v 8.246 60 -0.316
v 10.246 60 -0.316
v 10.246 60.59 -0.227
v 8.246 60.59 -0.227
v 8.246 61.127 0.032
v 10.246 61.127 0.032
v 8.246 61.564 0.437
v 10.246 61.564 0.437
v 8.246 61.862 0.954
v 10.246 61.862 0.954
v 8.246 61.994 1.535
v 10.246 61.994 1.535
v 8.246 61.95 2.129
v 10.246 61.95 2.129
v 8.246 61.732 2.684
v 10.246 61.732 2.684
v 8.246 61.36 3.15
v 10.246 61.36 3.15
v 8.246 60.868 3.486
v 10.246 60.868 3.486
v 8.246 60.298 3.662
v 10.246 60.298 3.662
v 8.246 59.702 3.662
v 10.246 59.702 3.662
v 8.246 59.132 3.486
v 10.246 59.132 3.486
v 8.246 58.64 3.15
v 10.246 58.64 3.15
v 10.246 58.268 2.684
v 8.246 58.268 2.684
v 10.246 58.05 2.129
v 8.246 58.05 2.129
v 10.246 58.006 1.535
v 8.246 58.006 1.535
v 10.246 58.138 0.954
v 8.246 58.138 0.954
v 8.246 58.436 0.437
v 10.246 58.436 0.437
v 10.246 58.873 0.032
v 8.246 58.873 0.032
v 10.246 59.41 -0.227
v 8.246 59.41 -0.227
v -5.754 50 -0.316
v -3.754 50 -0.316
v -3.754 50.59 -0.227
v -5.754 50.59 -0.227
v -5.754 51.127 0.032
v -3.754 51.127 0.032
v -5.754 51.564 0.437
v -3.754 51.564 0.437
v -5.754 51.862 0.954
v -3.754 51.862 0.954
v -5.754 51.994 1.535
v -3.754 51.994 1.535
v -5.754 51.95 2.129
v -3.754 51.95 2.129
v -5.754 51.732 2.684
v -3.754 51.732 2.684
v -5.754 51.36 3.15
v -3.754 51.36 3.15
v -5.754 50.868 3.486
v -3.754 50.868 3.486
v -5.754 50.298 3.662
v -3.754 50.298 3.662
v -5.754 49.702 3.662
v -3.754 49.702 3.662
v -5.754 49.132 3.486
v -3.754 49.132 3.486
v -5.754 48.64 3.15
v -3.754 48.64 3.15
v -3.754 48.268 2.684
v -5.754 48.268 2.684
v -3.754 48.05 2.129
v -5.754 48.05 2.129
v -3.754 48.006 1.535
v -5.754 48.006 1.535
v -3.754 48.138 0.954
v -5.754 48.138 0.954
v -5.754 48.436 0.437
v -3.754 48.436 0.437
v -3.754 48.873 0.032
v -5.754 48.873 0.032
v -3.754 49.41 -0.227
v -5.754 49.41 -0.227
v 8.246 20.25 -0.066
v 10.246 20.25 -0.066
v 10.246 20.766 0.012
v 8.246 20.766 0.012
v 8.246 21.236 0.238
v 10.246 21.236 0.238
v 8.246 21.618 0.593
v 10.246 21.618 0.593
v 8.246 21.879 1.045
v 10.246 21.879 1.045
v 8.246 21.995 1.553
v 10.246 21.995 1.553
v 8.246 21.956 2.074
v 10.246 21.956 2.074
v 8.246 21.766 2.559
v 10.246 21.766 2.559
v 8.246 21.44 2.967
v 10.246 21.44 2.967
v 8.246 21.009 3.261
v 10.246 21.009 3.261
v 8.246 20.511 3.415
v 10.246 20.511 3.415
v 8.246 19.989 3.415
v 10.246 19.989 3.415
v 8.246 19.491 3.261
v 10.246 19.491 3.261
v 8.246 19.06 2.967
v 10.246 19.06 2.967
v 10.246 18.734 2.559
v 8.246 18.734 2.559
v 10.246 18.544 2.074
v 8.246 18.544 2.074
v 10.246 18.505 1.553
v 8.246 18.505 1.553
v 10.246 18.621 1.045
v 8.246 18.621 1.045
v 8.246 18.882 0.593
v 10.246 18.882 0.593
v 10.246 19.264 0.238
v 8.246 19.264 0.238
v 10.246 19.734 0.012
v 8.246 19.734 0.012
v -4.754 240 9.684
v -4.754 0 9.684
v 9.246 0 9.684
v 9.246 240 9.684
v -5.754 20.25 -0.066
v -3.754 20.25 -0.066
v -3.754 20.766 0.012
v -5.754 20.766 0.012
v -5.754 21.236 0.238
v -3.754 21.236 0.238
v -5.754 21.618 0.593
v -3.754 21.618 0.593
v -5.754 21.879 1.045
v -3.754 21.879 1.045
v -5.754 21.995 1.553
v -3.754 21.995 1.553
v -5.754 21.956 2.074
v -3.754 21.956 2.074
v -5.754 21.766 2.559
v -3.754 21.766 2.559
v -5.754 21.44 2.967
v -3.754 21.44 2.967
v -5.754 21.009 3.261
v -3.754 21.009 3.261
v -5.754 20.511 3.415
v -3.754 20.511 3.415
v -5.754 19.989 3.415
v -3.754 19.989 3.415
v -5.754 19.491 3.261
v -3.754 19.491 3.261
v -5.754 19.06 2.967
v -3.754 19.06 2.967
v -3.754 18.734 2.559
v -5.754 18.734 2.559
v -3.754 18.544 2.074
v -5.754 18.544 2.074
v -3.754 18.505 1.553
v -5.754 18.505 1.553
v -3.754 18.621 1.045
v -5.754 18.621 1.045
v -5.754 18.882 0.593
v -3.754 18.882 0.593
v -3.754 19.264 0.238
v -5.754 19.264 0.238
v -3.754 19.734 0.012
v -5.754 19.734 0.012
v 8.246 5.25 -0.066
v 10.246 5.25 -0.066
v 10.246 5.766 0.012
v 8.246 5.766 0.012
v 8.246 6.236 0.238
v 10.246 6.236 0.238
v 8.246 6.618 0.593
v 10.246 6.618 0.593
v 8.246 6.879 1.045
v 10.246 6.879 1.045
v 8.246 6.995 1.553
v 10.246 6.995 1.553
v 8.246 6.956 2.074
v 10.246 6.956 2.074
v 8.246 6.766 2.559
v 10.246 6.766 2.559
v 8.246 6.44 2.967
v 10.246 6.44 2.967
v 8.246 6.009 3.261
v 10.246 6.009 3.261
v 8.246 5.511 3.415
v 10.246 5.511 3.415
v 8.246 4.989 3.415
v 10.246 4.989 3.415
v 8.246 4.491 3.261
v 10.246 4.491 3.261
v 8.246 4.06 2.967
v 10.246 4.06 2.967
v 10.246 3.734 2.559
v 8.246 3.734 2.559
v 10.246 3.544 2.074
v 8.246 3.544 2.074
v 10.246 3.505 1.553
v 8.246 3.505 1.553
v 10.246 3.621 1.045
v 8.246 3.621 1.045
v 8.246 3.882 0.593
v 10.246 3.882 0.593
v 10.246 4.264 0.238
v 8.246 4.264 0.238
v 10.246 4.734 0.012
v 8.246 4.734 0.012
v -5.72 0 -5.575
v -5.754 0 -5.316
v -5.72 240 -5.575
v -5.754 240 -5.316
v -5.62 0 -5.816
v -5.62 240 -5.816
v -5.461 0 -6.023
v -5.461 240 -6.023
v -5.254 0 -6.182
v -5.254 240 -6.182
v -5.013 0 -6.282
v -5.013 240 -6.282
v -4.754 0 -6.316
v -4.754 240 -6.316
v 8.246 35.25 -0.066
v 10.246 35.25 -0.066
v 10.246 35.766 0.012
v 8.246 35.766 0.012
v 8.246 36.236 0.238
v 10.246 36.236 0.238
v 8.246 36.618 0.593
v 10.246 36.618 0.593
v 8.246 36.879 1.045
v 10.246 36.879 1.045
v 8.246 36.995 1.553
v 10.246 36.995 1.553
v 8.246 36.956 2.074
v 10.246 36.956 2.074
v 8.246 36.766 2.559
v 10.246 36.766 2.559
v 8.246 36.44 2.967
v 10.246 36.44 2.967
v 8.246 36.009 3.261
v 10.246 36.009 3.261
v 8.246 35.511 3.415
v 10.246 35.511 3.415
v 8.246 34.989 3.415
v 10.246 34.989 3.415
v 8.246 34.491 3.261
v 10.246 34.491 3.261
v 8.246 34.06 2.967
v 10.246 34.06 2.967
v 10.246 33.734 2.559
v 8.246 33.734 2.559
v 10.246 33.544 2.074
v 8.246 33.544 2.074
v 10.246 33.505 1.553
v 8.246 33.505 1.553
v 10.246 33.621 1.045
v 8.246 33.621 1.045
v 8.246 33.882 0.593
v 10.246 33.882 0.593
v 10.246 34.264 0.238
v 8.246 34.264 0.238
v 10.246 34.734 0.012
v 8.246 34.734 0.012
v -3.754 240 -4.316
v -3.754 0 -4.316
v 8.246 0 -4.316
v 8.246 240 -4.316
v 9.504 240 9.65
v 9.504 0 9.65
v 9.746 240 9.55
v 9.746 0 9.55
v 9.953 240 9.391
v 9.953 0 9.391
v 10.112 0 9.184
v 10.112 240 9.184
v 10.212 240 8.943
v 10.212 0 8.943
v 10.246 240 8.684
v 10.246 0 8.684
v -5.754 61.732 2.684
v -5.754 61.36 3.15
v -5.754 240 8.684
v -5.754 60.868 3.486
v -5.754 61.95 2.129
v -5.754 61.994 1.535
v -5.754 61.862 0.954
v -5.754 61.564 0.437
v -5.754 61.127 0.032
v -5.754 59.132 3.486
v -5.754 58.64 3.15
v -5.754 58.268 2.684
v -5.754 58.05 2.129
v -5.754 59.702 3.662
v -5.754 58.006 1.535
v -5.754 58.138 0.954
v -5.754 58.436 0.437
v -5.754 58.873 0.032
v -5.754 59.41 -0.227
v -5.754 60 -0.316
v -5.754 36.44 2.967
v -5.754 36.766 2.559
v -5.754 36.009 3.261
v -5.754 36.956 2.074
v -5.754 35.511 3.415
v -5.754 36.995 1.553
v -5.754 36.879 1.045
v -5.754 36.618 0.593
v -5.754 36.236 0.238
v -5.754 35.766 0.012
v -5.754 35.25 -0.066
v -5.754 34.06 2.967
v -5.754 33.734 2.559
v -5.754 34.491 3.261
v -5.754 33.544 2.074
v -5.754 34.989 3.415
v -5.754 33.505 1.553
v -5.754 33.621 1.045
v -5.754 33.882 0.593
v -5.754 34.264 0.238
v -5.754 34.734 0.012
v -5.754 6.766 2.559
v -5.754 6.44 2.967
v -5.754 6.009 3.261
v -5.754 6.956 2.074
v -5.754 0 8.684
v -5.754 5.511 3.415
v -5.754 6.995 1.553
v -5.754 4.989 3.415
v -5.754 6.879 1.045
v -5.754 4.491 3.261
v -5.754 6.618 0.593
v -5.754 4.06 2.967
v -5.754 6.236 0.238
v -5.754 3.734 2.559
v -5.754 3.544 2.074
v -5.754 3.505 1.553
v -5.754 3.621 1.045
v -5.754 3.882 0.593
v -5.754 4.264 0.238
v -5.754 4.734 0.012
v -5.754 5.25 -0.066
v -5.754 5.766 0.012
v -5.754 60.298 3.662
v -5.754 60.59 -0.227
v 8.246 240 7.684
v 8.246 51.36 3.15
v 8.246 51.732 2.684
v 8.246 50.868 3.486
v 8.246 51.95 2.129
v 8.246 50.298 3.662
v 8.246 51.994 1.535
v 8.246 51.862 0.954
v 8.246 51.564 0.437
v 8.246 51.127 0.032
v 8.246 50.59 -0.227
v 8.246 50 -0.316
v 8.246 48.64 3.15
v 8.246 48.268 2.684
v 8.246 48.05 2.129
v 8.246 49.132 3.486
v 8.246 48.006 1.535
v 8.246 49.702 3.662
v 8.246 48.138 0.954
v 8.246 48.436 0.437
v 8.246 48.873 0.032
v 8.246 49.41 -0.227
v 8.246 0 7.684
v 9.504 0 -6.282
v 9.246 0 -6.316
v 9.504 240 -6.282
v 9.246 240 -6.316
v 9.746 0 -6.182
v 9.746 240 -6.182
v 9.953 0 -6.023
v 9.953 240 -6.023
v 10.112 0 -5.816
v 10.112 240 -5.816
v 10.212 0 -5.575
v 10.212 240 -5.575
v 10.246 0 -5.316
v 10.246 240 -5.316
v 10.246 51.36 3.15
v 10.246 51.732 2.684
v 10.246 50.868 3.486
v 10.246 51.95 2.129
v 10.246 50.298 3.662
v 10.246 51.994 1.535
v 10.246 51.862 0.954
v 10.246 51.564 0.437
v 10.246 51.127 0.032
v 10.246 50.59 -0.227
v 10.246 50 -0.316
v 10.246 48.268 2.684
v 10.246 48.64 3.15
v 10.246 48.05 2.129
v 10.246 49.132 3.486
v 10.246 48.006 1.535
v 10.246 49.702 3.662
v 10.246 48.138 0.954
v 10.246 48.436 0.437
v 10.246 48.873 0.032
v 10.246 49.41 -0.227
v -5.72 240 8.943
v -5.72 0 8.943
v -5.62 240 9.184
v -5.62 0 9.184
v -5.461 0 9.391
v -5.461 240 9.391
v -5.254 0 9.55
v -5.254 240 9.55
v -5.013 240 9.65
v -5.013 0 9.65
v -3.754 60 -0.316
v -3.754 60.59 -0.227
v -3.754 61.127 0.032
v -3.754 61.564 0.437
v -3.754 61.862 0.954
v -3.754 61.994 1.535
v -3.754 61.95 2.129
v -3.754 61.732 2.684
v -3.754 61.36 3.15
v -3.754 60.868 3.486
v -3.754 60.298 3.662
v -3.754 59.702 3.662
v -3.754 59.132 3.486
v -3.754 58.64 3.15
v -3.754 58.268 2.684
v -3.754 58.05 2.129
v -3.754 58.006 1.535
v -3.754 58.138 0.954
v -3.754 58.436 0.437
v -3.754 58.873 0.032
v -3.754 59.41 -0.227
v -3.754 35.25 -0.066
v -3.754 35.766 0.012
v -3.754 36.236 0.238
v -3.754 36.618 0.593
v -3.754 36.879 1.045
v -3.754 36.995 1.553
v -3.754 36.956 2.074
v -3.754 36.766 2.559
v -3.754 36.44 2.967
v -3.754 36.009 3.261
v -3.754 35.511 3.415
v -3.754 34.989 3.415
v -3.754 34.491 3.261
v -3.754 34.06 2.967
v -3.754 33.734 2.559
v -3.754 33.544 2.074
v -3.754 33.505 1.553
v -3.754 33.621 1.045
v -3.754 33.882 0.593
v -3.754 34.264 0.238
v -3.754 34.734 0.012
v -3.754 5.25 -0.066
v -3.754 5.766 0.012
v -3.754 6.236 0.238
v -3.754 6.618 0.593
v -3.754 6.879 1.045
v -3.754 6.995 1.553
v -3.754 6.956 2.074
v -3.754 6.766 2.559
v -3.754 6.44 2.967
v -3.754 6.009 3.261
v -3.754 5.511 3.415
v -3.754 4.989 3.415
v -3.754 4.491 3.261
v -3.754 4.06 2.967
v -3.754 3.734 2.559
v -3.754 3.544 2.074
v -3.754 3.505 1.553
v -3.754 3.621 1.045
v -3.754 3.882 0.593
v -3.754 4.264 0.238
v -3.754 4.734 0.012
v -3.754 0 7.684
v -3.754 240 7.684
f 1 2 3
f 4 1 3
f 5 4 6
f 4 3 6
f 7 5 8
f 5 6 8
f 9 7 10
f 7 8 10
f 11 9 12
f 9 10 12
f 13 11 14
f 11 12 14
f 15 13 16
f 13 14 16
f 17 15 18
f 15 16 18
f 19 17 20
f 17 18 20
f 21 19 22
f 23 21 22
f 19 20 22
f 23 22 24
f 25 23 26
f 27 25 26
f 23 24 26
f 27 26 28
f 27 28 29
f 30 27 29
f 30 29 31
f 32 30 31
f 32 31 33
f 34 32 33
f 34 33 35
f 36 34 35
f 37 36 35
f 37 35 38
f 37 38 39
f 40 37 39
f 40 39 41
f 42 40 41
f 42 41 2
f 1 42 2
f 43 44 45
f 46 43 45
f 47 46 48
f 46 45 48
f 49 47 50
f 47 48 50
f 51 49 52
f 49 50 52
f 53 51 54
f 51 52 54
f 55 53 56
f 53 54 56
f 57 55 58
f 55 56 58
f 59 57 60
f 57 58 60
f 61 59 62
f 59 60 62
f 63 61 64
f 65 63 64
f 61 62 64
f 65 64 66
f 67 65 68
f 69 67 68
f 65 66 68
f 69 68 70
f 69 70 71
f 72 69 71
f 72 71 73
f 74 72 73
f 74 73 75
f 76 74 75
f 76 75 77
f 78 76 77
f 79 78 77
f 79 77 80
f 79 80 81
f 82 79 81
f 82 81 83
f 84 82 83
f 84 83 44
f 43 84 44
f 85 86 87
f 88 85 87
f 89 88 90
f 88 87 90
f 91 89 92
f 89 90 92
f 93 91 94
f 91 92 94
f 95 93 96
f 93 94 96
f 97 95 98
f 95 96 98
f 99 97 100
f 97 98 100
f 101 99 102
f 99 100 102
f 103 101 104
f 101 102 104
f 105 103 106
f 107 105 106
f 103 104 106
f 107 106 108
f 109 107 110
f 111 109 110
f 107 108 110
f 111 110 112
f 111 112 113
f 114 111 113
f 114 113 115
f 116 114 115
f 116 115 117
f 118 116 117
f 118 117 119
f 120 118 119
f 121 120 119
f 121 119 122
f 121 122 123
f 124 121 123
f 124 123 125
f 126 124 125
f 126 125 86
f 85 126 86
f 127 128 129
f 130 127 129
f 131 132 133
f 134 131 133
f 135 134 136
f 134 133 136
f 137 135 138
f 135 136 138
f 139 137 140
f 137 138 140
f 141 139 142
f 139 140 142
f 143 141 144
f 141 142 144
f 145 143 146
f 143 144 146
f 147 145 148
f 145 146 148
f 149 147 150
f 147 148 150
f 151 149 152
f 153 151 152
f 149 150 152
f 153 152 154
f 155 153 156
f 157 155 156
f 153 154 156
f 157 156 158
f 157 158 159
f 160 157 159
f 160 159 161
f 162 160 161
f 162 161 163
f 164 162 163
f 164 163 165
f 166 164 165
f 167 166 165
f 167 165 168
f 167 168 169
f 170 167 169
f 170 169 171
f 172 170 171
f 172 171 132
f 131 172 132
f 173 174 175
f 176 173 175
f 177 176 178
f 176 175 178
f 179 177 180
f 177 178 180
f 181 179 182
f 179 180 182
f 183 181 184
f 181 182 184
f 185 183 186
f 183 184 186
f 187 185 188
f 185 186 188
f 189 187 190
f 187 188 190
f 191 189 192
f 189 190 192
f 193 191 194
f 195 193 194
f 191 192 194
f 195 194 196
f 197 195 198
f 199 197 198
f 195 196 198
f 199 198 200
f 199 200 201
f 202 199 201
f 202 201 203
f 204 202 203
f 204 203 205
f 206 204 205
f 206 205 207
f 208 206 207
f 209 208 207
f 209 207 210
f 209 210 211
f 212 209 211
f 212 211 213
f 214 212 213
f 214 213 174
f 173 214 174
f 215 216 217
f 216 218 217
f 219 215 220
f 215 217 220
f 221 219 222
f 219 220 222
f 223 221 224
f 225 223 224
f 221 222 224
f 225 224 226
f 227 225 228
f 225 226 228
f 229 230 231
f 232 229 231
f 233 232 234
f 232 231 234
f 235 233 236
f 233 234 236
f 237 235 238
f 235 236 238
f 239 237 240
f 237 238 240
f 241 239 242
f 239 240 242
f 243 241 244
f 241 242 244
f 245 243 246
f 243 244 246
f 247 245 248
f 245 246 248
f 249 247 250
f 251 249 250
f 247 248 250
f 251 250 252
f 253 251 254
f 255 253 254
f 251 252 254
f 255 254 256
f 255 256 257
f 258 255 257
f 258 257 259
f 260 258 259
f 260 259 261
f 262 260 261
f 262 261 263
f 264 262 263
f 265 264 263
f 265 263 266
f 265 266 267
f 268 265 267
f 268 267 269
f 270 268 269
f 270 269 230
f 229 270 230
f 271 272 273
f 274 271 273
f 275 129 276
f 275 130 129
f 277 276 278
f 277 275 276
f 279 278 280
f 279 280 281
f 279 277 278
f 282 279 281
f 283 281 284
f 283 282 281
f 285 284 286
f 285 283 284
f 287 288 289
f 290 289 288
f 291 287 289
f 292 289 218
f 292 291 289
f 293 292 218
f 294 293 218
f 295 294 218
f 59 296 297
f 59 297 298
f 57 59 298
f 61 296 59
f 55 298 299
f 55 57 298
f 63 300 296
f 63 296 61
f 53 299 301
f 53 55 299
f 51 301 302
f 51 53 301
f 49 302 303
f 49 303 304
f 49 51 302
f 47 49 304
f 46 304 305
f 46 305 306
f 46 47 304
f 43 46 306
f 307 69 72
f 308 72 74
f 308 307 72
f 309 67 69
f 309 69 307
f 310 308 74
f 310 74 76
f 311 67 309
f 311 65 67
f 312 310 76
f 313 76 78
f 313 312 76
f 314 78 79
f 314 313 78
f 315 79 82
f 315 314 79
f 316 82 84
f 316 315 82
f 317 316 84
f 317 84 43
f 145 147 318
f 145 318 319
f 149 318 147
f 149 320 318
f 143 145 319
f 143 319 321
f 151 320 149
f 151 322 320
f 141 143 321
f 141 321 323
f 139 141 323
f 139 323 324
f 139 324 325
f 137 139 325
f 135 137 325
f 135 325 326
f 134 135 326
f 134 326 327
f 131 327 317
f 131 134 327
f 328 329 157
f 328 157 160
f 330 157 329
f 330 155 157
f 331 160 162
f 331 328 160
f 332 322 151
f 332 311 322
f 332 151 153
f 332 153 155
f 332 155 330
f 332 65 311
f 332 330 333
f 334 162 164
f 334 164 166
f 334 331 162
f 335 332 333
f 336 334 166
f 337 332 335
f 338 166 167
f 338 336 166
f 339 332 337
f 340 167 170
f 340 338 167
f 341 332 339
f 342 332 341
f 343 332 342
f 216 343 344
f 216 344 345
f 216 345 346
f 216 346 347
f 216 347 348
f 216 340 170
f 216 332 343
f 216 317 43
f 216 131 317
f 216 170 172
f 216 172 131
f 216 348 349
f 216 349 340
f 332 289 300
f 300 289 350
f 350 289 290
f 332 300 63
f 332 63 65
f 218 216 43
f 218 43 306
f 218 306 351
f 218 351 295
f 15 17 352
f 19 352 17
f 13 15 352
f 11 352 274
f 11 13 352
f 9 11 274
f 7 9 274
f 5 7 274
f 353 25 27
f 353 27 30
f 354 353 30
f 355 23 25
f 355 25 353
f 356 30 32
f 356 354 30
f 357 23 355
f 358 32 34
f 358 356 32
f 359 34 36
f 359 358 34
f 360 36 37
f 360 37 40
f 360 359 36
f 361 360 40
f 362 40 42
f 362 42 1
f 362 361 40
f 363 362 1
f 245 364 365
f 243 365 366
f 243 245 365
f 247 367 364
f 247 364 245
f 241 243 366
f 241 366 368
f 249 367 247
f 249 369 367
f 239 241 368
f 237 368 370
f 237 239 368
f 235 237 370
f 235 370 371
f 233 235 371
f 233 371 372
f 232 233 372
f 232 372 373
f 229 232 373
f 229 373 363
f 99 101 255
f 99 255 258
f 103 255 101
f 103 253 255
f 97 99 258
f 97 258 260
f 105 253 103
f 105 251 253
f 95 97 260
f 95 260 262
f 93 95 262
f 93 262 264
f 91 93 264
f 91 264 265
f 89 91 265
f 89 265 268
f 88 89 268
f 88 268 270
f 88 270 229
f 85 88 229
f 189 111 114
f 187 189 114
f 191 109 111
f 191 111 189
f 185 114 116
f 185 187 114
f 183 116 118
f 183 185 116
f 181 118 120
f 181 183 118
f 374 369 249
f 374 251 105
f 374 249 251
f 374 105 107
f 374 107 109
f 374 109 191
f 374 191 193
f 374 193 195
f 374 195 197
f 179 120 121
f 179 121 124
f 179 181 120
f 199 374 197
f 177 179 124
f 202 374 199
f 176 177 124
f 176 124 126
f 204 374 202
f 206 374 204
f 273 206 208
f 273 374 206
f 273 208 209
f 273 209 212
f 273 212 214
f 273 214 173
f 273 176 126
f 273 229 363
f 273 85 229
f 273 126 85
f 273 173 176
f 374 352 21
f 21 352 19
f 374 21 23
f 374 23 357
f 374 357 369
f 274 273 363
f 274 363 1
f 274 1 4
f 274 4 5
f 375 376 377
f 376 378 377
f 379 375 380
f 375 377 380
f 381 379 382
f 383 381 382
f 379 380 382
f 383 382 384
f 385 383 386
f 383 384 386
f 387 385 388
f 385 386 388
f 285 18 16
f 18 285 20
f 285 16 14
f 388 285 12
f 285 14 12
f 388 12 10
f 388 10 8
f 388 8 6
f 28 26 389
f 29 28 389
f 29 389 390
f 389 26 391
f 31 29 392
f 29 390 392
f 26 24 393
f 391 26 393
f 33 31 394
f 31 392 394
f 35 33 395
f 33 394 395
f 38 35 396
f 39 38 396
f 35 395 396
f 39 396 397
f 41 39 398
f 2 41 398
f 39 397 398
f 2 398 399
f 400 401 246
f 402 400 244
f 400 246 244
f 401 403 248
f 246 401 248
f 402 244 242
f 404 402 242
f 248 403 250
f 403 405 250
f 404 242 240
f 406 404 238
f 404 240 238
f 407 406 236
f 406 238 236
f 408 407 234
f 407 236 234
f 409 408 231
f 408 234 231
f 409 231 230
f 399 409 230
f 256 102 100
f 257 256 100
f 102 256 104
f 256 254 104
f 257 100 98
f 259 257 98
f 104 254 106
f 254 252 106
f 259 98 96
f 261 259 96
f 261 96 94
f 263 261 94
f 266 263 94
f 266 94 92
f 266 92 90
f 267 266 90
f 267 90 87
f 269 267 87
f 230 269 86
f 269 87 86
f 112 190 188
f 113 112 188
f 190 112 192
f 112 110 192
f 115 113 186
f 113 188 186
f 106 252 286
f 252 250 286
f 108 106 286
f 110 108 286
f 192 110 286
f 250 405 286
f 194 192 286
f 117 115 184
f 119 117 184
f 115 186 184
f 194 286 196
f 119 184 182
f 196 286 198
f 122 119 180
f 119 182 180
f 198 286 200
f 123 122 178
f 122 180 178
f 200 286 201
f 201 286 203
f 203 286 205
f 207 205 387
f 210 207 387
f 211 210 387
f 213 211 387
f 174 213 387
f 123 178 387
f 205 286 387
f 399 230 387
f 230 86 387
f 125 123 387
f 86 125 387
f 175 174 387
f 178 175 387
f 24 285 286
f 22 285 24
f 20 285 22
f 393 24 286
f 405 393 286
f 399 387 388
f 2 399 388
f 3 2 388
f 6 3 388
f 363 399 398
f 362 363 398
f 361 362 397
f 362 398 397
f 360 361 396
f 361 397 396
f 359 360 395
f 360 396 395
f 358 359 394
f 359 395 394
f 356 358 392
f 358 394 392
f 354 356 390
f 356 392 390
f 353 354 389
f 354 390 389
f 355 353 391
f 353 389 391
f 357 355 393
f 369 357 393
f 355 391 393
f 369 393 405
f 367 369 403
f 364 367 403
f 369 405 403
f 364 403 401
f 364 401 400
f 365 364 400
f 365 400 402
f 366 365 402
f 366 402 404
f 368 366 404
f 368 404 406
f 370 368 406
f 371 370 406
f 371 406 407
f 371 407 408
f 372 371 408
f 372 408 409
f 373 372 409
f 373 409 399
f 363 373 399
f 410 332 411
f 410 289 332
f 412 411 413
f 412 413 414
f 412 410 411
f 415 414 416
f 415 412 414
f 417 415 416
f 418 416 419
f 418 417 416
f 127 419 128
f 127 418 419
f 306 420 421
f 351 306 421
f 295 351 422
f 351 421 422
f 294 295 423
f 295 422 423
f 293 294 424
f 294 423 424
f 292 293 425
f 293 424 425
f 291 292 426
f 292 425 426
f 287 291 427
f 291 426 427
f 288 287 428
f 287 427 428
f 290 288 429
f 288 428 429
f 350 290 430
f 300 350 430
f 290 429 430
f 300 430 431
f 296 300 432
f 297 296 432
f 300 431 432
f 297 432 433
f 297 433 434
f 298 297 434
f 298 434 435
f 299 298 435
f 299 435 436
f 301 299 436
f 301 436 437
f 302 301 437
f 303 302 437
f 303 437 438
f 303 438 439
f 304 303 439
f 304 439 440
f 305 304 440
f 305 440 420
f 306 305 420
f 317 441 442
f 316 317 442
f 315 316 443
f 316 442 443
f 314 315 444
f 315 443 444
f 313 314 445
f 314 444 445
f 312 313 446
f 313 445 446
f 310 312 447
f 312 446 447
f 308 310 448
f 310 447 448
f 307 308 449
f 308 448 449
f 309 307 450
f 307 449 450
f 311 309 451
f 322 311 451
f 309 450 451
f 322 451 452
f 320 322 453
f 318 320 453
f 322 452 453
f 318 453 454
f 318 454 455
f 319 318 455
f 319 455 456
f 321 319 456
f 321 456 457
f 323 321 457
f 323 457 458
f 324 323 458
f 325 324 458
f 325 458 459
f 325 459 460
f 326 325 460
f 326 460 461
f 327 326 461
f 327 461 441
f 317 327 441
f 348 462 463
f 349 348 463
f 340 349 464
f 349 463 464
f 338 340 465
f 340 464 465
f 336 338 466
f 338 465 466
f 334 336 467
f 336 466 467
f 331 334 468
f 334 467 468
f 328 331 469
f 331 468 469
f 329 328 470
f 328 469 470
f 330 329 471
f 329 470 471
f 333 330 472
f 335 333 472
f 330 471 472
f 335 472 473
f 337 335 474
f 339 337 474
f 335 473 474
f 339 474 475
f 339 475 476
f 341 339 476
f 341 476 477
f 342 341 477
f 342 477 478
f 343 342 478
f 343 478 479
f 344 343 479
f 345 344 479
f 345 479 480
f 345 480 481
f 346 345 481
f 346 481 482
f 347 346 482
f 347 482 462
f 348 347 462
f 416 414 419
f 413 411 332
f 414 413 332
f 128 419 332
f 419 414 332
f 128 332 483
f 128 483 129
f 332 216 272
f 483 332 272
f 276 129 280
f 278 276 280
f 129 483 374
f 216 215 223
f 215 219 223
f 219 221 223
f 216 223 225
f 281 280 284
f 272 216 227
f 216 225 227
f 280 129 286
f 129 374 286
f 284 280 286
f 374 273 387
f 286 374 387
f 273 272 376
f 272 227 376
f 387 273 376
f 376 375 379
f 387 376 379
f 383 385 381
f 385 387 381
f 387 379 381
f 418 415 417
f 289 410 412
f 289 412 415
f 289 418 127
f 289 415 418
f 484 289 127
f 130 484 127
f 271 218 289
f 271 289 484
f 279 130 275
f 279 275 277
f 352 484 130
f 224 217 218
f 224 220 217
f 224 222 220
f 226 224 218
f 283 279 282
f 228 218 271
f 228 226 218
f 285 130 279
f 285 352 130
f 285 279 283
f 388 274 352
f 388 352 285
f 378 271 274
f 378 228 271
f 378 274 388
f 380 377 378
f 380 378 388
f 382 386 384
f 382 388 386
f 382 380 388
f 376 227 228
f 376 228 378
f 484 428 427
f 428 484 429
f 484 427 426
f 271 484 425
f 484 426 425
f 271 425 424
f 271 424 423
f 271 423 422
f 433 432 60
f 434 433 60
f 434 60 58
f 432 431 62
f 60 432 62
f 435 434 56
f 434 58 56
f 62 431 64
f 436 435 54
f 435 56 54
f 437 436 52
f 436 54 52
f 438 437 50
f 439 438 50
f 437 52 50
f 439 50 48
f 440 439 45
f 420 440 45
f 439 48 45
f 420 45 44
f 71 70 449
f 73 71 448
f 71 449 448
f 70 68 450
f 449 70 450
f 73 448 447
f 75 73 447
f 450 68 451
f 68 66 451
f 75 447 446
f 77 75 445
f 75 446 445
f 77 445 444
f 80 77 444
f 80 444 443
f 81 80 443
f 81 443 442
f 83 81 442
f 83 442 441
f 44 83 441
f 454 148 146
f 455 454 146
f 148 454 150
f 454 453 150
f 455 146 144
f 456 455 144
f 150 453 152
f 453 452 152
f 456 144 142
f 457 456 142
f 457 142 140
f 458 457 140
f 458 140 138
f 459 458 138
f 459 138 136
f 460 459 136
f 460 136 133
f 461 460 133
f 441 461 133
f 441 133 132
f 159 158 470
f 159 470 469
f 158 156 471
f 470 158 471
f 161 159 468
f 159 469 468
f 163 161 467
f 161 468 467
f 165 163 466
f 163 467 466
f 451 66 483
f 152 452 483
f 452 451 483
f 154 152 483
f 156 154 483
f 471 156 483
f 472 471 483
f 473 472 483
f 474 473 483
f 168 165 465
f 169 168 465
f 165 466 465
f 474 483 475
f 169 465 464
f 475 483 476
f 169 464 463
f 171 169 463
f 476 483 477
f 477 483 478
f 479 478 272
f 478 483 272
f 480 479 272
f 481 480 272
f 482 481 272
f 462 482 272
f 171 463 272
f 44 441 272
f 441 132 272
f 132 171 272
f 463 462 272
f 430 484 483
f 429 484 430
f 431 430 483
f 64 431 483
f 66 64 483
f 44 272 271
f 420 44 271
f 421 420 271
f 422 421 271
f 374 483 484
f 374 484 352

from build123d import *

# Parameters (mm, degrees)
SKETCH1_W           = 16
SKETCH1_H           = 16
SKETCH1_W_2         = 12
SKETCH1_H_2         = 12
BOSS_EXTRUDE1_DEPTH = 240
FILLET1_R           = 1
SKETCH2_R           = 1.75
CUT_EXTRUDE1_DEPTH  = 20
SKETCH3_R           = 2
CUT_EXTRUDE2_DEPTH  = 20


with BuildPart() as part:
    # Sketch1 → Boss-Extrude1 (new body)
    with BuildSketch(Plane(origin=(0, 0, 0), x_dir=(1, 0, 0), z_dir=(0, 1, 0))):
        with Locations((2.245614035, -1.684210526)):
            Rectangle(SKETCH1_W, SKETCH1_H)
        with Locations((2.245614035, -1.684210526)):
            Rectangle(SKETCH1_W_2, SKETCH1_H_2, mode=Mode.SUBTRACT)
    extrude(amount=BOSS_EXTRUDE1_DEPTH)

    # Fillet1
    fillet1_edges = [part.edges().sort_by_distance(p)[0] for p in [
        (-5.754385965, 120, -6.315789474),
        (10.245614035, 120, -6.315789474),
        (10.245614035, 120, 9.684210526),
        (-5.754385965, 120, 9.684210526),
    ]]
    fillet(fillet1_edges, radius=FILLET1_R)

    # Sketch2 → Cut-Extrude1 (cut)
    with BuildSketch(Plane(origin=(10.245614035, 0, 0), x_dir=(0, 0, -1), z_dir=(1, 0, 0))):
        with Locations((-1.684210526, 35.25)):
            Circle(SKETCH2_R)
        with Locations((-1.684210526, 5.25)):
            Circle(SKETCH2_R)
        with Locations((-1.684210526, 20.25)):
            Circle(SKETCH2_R)
    extrude(amount=-CUT_EXTRUDE1_DEPTH, mode=Mode.SUBTRACT)

    # Sketch3 → Cut-Extrude2 (cut)
    with BuildSketch(Plane(origin=(10.245614035, 0, 0), x_dir=(0, 0, -1), z_dir=(1, 0, 0))):
        with Locations((-1.684210526, 60)):
            Circle(SKETCH3_R)
        with Locations((-1.684210526, 50)):
            Circle(SKETCH3_R)
    extrude(amount=-CUT_EXTRUDE2_DEPTH, mode=Mode.SUBTRACT)


solid = part.part
